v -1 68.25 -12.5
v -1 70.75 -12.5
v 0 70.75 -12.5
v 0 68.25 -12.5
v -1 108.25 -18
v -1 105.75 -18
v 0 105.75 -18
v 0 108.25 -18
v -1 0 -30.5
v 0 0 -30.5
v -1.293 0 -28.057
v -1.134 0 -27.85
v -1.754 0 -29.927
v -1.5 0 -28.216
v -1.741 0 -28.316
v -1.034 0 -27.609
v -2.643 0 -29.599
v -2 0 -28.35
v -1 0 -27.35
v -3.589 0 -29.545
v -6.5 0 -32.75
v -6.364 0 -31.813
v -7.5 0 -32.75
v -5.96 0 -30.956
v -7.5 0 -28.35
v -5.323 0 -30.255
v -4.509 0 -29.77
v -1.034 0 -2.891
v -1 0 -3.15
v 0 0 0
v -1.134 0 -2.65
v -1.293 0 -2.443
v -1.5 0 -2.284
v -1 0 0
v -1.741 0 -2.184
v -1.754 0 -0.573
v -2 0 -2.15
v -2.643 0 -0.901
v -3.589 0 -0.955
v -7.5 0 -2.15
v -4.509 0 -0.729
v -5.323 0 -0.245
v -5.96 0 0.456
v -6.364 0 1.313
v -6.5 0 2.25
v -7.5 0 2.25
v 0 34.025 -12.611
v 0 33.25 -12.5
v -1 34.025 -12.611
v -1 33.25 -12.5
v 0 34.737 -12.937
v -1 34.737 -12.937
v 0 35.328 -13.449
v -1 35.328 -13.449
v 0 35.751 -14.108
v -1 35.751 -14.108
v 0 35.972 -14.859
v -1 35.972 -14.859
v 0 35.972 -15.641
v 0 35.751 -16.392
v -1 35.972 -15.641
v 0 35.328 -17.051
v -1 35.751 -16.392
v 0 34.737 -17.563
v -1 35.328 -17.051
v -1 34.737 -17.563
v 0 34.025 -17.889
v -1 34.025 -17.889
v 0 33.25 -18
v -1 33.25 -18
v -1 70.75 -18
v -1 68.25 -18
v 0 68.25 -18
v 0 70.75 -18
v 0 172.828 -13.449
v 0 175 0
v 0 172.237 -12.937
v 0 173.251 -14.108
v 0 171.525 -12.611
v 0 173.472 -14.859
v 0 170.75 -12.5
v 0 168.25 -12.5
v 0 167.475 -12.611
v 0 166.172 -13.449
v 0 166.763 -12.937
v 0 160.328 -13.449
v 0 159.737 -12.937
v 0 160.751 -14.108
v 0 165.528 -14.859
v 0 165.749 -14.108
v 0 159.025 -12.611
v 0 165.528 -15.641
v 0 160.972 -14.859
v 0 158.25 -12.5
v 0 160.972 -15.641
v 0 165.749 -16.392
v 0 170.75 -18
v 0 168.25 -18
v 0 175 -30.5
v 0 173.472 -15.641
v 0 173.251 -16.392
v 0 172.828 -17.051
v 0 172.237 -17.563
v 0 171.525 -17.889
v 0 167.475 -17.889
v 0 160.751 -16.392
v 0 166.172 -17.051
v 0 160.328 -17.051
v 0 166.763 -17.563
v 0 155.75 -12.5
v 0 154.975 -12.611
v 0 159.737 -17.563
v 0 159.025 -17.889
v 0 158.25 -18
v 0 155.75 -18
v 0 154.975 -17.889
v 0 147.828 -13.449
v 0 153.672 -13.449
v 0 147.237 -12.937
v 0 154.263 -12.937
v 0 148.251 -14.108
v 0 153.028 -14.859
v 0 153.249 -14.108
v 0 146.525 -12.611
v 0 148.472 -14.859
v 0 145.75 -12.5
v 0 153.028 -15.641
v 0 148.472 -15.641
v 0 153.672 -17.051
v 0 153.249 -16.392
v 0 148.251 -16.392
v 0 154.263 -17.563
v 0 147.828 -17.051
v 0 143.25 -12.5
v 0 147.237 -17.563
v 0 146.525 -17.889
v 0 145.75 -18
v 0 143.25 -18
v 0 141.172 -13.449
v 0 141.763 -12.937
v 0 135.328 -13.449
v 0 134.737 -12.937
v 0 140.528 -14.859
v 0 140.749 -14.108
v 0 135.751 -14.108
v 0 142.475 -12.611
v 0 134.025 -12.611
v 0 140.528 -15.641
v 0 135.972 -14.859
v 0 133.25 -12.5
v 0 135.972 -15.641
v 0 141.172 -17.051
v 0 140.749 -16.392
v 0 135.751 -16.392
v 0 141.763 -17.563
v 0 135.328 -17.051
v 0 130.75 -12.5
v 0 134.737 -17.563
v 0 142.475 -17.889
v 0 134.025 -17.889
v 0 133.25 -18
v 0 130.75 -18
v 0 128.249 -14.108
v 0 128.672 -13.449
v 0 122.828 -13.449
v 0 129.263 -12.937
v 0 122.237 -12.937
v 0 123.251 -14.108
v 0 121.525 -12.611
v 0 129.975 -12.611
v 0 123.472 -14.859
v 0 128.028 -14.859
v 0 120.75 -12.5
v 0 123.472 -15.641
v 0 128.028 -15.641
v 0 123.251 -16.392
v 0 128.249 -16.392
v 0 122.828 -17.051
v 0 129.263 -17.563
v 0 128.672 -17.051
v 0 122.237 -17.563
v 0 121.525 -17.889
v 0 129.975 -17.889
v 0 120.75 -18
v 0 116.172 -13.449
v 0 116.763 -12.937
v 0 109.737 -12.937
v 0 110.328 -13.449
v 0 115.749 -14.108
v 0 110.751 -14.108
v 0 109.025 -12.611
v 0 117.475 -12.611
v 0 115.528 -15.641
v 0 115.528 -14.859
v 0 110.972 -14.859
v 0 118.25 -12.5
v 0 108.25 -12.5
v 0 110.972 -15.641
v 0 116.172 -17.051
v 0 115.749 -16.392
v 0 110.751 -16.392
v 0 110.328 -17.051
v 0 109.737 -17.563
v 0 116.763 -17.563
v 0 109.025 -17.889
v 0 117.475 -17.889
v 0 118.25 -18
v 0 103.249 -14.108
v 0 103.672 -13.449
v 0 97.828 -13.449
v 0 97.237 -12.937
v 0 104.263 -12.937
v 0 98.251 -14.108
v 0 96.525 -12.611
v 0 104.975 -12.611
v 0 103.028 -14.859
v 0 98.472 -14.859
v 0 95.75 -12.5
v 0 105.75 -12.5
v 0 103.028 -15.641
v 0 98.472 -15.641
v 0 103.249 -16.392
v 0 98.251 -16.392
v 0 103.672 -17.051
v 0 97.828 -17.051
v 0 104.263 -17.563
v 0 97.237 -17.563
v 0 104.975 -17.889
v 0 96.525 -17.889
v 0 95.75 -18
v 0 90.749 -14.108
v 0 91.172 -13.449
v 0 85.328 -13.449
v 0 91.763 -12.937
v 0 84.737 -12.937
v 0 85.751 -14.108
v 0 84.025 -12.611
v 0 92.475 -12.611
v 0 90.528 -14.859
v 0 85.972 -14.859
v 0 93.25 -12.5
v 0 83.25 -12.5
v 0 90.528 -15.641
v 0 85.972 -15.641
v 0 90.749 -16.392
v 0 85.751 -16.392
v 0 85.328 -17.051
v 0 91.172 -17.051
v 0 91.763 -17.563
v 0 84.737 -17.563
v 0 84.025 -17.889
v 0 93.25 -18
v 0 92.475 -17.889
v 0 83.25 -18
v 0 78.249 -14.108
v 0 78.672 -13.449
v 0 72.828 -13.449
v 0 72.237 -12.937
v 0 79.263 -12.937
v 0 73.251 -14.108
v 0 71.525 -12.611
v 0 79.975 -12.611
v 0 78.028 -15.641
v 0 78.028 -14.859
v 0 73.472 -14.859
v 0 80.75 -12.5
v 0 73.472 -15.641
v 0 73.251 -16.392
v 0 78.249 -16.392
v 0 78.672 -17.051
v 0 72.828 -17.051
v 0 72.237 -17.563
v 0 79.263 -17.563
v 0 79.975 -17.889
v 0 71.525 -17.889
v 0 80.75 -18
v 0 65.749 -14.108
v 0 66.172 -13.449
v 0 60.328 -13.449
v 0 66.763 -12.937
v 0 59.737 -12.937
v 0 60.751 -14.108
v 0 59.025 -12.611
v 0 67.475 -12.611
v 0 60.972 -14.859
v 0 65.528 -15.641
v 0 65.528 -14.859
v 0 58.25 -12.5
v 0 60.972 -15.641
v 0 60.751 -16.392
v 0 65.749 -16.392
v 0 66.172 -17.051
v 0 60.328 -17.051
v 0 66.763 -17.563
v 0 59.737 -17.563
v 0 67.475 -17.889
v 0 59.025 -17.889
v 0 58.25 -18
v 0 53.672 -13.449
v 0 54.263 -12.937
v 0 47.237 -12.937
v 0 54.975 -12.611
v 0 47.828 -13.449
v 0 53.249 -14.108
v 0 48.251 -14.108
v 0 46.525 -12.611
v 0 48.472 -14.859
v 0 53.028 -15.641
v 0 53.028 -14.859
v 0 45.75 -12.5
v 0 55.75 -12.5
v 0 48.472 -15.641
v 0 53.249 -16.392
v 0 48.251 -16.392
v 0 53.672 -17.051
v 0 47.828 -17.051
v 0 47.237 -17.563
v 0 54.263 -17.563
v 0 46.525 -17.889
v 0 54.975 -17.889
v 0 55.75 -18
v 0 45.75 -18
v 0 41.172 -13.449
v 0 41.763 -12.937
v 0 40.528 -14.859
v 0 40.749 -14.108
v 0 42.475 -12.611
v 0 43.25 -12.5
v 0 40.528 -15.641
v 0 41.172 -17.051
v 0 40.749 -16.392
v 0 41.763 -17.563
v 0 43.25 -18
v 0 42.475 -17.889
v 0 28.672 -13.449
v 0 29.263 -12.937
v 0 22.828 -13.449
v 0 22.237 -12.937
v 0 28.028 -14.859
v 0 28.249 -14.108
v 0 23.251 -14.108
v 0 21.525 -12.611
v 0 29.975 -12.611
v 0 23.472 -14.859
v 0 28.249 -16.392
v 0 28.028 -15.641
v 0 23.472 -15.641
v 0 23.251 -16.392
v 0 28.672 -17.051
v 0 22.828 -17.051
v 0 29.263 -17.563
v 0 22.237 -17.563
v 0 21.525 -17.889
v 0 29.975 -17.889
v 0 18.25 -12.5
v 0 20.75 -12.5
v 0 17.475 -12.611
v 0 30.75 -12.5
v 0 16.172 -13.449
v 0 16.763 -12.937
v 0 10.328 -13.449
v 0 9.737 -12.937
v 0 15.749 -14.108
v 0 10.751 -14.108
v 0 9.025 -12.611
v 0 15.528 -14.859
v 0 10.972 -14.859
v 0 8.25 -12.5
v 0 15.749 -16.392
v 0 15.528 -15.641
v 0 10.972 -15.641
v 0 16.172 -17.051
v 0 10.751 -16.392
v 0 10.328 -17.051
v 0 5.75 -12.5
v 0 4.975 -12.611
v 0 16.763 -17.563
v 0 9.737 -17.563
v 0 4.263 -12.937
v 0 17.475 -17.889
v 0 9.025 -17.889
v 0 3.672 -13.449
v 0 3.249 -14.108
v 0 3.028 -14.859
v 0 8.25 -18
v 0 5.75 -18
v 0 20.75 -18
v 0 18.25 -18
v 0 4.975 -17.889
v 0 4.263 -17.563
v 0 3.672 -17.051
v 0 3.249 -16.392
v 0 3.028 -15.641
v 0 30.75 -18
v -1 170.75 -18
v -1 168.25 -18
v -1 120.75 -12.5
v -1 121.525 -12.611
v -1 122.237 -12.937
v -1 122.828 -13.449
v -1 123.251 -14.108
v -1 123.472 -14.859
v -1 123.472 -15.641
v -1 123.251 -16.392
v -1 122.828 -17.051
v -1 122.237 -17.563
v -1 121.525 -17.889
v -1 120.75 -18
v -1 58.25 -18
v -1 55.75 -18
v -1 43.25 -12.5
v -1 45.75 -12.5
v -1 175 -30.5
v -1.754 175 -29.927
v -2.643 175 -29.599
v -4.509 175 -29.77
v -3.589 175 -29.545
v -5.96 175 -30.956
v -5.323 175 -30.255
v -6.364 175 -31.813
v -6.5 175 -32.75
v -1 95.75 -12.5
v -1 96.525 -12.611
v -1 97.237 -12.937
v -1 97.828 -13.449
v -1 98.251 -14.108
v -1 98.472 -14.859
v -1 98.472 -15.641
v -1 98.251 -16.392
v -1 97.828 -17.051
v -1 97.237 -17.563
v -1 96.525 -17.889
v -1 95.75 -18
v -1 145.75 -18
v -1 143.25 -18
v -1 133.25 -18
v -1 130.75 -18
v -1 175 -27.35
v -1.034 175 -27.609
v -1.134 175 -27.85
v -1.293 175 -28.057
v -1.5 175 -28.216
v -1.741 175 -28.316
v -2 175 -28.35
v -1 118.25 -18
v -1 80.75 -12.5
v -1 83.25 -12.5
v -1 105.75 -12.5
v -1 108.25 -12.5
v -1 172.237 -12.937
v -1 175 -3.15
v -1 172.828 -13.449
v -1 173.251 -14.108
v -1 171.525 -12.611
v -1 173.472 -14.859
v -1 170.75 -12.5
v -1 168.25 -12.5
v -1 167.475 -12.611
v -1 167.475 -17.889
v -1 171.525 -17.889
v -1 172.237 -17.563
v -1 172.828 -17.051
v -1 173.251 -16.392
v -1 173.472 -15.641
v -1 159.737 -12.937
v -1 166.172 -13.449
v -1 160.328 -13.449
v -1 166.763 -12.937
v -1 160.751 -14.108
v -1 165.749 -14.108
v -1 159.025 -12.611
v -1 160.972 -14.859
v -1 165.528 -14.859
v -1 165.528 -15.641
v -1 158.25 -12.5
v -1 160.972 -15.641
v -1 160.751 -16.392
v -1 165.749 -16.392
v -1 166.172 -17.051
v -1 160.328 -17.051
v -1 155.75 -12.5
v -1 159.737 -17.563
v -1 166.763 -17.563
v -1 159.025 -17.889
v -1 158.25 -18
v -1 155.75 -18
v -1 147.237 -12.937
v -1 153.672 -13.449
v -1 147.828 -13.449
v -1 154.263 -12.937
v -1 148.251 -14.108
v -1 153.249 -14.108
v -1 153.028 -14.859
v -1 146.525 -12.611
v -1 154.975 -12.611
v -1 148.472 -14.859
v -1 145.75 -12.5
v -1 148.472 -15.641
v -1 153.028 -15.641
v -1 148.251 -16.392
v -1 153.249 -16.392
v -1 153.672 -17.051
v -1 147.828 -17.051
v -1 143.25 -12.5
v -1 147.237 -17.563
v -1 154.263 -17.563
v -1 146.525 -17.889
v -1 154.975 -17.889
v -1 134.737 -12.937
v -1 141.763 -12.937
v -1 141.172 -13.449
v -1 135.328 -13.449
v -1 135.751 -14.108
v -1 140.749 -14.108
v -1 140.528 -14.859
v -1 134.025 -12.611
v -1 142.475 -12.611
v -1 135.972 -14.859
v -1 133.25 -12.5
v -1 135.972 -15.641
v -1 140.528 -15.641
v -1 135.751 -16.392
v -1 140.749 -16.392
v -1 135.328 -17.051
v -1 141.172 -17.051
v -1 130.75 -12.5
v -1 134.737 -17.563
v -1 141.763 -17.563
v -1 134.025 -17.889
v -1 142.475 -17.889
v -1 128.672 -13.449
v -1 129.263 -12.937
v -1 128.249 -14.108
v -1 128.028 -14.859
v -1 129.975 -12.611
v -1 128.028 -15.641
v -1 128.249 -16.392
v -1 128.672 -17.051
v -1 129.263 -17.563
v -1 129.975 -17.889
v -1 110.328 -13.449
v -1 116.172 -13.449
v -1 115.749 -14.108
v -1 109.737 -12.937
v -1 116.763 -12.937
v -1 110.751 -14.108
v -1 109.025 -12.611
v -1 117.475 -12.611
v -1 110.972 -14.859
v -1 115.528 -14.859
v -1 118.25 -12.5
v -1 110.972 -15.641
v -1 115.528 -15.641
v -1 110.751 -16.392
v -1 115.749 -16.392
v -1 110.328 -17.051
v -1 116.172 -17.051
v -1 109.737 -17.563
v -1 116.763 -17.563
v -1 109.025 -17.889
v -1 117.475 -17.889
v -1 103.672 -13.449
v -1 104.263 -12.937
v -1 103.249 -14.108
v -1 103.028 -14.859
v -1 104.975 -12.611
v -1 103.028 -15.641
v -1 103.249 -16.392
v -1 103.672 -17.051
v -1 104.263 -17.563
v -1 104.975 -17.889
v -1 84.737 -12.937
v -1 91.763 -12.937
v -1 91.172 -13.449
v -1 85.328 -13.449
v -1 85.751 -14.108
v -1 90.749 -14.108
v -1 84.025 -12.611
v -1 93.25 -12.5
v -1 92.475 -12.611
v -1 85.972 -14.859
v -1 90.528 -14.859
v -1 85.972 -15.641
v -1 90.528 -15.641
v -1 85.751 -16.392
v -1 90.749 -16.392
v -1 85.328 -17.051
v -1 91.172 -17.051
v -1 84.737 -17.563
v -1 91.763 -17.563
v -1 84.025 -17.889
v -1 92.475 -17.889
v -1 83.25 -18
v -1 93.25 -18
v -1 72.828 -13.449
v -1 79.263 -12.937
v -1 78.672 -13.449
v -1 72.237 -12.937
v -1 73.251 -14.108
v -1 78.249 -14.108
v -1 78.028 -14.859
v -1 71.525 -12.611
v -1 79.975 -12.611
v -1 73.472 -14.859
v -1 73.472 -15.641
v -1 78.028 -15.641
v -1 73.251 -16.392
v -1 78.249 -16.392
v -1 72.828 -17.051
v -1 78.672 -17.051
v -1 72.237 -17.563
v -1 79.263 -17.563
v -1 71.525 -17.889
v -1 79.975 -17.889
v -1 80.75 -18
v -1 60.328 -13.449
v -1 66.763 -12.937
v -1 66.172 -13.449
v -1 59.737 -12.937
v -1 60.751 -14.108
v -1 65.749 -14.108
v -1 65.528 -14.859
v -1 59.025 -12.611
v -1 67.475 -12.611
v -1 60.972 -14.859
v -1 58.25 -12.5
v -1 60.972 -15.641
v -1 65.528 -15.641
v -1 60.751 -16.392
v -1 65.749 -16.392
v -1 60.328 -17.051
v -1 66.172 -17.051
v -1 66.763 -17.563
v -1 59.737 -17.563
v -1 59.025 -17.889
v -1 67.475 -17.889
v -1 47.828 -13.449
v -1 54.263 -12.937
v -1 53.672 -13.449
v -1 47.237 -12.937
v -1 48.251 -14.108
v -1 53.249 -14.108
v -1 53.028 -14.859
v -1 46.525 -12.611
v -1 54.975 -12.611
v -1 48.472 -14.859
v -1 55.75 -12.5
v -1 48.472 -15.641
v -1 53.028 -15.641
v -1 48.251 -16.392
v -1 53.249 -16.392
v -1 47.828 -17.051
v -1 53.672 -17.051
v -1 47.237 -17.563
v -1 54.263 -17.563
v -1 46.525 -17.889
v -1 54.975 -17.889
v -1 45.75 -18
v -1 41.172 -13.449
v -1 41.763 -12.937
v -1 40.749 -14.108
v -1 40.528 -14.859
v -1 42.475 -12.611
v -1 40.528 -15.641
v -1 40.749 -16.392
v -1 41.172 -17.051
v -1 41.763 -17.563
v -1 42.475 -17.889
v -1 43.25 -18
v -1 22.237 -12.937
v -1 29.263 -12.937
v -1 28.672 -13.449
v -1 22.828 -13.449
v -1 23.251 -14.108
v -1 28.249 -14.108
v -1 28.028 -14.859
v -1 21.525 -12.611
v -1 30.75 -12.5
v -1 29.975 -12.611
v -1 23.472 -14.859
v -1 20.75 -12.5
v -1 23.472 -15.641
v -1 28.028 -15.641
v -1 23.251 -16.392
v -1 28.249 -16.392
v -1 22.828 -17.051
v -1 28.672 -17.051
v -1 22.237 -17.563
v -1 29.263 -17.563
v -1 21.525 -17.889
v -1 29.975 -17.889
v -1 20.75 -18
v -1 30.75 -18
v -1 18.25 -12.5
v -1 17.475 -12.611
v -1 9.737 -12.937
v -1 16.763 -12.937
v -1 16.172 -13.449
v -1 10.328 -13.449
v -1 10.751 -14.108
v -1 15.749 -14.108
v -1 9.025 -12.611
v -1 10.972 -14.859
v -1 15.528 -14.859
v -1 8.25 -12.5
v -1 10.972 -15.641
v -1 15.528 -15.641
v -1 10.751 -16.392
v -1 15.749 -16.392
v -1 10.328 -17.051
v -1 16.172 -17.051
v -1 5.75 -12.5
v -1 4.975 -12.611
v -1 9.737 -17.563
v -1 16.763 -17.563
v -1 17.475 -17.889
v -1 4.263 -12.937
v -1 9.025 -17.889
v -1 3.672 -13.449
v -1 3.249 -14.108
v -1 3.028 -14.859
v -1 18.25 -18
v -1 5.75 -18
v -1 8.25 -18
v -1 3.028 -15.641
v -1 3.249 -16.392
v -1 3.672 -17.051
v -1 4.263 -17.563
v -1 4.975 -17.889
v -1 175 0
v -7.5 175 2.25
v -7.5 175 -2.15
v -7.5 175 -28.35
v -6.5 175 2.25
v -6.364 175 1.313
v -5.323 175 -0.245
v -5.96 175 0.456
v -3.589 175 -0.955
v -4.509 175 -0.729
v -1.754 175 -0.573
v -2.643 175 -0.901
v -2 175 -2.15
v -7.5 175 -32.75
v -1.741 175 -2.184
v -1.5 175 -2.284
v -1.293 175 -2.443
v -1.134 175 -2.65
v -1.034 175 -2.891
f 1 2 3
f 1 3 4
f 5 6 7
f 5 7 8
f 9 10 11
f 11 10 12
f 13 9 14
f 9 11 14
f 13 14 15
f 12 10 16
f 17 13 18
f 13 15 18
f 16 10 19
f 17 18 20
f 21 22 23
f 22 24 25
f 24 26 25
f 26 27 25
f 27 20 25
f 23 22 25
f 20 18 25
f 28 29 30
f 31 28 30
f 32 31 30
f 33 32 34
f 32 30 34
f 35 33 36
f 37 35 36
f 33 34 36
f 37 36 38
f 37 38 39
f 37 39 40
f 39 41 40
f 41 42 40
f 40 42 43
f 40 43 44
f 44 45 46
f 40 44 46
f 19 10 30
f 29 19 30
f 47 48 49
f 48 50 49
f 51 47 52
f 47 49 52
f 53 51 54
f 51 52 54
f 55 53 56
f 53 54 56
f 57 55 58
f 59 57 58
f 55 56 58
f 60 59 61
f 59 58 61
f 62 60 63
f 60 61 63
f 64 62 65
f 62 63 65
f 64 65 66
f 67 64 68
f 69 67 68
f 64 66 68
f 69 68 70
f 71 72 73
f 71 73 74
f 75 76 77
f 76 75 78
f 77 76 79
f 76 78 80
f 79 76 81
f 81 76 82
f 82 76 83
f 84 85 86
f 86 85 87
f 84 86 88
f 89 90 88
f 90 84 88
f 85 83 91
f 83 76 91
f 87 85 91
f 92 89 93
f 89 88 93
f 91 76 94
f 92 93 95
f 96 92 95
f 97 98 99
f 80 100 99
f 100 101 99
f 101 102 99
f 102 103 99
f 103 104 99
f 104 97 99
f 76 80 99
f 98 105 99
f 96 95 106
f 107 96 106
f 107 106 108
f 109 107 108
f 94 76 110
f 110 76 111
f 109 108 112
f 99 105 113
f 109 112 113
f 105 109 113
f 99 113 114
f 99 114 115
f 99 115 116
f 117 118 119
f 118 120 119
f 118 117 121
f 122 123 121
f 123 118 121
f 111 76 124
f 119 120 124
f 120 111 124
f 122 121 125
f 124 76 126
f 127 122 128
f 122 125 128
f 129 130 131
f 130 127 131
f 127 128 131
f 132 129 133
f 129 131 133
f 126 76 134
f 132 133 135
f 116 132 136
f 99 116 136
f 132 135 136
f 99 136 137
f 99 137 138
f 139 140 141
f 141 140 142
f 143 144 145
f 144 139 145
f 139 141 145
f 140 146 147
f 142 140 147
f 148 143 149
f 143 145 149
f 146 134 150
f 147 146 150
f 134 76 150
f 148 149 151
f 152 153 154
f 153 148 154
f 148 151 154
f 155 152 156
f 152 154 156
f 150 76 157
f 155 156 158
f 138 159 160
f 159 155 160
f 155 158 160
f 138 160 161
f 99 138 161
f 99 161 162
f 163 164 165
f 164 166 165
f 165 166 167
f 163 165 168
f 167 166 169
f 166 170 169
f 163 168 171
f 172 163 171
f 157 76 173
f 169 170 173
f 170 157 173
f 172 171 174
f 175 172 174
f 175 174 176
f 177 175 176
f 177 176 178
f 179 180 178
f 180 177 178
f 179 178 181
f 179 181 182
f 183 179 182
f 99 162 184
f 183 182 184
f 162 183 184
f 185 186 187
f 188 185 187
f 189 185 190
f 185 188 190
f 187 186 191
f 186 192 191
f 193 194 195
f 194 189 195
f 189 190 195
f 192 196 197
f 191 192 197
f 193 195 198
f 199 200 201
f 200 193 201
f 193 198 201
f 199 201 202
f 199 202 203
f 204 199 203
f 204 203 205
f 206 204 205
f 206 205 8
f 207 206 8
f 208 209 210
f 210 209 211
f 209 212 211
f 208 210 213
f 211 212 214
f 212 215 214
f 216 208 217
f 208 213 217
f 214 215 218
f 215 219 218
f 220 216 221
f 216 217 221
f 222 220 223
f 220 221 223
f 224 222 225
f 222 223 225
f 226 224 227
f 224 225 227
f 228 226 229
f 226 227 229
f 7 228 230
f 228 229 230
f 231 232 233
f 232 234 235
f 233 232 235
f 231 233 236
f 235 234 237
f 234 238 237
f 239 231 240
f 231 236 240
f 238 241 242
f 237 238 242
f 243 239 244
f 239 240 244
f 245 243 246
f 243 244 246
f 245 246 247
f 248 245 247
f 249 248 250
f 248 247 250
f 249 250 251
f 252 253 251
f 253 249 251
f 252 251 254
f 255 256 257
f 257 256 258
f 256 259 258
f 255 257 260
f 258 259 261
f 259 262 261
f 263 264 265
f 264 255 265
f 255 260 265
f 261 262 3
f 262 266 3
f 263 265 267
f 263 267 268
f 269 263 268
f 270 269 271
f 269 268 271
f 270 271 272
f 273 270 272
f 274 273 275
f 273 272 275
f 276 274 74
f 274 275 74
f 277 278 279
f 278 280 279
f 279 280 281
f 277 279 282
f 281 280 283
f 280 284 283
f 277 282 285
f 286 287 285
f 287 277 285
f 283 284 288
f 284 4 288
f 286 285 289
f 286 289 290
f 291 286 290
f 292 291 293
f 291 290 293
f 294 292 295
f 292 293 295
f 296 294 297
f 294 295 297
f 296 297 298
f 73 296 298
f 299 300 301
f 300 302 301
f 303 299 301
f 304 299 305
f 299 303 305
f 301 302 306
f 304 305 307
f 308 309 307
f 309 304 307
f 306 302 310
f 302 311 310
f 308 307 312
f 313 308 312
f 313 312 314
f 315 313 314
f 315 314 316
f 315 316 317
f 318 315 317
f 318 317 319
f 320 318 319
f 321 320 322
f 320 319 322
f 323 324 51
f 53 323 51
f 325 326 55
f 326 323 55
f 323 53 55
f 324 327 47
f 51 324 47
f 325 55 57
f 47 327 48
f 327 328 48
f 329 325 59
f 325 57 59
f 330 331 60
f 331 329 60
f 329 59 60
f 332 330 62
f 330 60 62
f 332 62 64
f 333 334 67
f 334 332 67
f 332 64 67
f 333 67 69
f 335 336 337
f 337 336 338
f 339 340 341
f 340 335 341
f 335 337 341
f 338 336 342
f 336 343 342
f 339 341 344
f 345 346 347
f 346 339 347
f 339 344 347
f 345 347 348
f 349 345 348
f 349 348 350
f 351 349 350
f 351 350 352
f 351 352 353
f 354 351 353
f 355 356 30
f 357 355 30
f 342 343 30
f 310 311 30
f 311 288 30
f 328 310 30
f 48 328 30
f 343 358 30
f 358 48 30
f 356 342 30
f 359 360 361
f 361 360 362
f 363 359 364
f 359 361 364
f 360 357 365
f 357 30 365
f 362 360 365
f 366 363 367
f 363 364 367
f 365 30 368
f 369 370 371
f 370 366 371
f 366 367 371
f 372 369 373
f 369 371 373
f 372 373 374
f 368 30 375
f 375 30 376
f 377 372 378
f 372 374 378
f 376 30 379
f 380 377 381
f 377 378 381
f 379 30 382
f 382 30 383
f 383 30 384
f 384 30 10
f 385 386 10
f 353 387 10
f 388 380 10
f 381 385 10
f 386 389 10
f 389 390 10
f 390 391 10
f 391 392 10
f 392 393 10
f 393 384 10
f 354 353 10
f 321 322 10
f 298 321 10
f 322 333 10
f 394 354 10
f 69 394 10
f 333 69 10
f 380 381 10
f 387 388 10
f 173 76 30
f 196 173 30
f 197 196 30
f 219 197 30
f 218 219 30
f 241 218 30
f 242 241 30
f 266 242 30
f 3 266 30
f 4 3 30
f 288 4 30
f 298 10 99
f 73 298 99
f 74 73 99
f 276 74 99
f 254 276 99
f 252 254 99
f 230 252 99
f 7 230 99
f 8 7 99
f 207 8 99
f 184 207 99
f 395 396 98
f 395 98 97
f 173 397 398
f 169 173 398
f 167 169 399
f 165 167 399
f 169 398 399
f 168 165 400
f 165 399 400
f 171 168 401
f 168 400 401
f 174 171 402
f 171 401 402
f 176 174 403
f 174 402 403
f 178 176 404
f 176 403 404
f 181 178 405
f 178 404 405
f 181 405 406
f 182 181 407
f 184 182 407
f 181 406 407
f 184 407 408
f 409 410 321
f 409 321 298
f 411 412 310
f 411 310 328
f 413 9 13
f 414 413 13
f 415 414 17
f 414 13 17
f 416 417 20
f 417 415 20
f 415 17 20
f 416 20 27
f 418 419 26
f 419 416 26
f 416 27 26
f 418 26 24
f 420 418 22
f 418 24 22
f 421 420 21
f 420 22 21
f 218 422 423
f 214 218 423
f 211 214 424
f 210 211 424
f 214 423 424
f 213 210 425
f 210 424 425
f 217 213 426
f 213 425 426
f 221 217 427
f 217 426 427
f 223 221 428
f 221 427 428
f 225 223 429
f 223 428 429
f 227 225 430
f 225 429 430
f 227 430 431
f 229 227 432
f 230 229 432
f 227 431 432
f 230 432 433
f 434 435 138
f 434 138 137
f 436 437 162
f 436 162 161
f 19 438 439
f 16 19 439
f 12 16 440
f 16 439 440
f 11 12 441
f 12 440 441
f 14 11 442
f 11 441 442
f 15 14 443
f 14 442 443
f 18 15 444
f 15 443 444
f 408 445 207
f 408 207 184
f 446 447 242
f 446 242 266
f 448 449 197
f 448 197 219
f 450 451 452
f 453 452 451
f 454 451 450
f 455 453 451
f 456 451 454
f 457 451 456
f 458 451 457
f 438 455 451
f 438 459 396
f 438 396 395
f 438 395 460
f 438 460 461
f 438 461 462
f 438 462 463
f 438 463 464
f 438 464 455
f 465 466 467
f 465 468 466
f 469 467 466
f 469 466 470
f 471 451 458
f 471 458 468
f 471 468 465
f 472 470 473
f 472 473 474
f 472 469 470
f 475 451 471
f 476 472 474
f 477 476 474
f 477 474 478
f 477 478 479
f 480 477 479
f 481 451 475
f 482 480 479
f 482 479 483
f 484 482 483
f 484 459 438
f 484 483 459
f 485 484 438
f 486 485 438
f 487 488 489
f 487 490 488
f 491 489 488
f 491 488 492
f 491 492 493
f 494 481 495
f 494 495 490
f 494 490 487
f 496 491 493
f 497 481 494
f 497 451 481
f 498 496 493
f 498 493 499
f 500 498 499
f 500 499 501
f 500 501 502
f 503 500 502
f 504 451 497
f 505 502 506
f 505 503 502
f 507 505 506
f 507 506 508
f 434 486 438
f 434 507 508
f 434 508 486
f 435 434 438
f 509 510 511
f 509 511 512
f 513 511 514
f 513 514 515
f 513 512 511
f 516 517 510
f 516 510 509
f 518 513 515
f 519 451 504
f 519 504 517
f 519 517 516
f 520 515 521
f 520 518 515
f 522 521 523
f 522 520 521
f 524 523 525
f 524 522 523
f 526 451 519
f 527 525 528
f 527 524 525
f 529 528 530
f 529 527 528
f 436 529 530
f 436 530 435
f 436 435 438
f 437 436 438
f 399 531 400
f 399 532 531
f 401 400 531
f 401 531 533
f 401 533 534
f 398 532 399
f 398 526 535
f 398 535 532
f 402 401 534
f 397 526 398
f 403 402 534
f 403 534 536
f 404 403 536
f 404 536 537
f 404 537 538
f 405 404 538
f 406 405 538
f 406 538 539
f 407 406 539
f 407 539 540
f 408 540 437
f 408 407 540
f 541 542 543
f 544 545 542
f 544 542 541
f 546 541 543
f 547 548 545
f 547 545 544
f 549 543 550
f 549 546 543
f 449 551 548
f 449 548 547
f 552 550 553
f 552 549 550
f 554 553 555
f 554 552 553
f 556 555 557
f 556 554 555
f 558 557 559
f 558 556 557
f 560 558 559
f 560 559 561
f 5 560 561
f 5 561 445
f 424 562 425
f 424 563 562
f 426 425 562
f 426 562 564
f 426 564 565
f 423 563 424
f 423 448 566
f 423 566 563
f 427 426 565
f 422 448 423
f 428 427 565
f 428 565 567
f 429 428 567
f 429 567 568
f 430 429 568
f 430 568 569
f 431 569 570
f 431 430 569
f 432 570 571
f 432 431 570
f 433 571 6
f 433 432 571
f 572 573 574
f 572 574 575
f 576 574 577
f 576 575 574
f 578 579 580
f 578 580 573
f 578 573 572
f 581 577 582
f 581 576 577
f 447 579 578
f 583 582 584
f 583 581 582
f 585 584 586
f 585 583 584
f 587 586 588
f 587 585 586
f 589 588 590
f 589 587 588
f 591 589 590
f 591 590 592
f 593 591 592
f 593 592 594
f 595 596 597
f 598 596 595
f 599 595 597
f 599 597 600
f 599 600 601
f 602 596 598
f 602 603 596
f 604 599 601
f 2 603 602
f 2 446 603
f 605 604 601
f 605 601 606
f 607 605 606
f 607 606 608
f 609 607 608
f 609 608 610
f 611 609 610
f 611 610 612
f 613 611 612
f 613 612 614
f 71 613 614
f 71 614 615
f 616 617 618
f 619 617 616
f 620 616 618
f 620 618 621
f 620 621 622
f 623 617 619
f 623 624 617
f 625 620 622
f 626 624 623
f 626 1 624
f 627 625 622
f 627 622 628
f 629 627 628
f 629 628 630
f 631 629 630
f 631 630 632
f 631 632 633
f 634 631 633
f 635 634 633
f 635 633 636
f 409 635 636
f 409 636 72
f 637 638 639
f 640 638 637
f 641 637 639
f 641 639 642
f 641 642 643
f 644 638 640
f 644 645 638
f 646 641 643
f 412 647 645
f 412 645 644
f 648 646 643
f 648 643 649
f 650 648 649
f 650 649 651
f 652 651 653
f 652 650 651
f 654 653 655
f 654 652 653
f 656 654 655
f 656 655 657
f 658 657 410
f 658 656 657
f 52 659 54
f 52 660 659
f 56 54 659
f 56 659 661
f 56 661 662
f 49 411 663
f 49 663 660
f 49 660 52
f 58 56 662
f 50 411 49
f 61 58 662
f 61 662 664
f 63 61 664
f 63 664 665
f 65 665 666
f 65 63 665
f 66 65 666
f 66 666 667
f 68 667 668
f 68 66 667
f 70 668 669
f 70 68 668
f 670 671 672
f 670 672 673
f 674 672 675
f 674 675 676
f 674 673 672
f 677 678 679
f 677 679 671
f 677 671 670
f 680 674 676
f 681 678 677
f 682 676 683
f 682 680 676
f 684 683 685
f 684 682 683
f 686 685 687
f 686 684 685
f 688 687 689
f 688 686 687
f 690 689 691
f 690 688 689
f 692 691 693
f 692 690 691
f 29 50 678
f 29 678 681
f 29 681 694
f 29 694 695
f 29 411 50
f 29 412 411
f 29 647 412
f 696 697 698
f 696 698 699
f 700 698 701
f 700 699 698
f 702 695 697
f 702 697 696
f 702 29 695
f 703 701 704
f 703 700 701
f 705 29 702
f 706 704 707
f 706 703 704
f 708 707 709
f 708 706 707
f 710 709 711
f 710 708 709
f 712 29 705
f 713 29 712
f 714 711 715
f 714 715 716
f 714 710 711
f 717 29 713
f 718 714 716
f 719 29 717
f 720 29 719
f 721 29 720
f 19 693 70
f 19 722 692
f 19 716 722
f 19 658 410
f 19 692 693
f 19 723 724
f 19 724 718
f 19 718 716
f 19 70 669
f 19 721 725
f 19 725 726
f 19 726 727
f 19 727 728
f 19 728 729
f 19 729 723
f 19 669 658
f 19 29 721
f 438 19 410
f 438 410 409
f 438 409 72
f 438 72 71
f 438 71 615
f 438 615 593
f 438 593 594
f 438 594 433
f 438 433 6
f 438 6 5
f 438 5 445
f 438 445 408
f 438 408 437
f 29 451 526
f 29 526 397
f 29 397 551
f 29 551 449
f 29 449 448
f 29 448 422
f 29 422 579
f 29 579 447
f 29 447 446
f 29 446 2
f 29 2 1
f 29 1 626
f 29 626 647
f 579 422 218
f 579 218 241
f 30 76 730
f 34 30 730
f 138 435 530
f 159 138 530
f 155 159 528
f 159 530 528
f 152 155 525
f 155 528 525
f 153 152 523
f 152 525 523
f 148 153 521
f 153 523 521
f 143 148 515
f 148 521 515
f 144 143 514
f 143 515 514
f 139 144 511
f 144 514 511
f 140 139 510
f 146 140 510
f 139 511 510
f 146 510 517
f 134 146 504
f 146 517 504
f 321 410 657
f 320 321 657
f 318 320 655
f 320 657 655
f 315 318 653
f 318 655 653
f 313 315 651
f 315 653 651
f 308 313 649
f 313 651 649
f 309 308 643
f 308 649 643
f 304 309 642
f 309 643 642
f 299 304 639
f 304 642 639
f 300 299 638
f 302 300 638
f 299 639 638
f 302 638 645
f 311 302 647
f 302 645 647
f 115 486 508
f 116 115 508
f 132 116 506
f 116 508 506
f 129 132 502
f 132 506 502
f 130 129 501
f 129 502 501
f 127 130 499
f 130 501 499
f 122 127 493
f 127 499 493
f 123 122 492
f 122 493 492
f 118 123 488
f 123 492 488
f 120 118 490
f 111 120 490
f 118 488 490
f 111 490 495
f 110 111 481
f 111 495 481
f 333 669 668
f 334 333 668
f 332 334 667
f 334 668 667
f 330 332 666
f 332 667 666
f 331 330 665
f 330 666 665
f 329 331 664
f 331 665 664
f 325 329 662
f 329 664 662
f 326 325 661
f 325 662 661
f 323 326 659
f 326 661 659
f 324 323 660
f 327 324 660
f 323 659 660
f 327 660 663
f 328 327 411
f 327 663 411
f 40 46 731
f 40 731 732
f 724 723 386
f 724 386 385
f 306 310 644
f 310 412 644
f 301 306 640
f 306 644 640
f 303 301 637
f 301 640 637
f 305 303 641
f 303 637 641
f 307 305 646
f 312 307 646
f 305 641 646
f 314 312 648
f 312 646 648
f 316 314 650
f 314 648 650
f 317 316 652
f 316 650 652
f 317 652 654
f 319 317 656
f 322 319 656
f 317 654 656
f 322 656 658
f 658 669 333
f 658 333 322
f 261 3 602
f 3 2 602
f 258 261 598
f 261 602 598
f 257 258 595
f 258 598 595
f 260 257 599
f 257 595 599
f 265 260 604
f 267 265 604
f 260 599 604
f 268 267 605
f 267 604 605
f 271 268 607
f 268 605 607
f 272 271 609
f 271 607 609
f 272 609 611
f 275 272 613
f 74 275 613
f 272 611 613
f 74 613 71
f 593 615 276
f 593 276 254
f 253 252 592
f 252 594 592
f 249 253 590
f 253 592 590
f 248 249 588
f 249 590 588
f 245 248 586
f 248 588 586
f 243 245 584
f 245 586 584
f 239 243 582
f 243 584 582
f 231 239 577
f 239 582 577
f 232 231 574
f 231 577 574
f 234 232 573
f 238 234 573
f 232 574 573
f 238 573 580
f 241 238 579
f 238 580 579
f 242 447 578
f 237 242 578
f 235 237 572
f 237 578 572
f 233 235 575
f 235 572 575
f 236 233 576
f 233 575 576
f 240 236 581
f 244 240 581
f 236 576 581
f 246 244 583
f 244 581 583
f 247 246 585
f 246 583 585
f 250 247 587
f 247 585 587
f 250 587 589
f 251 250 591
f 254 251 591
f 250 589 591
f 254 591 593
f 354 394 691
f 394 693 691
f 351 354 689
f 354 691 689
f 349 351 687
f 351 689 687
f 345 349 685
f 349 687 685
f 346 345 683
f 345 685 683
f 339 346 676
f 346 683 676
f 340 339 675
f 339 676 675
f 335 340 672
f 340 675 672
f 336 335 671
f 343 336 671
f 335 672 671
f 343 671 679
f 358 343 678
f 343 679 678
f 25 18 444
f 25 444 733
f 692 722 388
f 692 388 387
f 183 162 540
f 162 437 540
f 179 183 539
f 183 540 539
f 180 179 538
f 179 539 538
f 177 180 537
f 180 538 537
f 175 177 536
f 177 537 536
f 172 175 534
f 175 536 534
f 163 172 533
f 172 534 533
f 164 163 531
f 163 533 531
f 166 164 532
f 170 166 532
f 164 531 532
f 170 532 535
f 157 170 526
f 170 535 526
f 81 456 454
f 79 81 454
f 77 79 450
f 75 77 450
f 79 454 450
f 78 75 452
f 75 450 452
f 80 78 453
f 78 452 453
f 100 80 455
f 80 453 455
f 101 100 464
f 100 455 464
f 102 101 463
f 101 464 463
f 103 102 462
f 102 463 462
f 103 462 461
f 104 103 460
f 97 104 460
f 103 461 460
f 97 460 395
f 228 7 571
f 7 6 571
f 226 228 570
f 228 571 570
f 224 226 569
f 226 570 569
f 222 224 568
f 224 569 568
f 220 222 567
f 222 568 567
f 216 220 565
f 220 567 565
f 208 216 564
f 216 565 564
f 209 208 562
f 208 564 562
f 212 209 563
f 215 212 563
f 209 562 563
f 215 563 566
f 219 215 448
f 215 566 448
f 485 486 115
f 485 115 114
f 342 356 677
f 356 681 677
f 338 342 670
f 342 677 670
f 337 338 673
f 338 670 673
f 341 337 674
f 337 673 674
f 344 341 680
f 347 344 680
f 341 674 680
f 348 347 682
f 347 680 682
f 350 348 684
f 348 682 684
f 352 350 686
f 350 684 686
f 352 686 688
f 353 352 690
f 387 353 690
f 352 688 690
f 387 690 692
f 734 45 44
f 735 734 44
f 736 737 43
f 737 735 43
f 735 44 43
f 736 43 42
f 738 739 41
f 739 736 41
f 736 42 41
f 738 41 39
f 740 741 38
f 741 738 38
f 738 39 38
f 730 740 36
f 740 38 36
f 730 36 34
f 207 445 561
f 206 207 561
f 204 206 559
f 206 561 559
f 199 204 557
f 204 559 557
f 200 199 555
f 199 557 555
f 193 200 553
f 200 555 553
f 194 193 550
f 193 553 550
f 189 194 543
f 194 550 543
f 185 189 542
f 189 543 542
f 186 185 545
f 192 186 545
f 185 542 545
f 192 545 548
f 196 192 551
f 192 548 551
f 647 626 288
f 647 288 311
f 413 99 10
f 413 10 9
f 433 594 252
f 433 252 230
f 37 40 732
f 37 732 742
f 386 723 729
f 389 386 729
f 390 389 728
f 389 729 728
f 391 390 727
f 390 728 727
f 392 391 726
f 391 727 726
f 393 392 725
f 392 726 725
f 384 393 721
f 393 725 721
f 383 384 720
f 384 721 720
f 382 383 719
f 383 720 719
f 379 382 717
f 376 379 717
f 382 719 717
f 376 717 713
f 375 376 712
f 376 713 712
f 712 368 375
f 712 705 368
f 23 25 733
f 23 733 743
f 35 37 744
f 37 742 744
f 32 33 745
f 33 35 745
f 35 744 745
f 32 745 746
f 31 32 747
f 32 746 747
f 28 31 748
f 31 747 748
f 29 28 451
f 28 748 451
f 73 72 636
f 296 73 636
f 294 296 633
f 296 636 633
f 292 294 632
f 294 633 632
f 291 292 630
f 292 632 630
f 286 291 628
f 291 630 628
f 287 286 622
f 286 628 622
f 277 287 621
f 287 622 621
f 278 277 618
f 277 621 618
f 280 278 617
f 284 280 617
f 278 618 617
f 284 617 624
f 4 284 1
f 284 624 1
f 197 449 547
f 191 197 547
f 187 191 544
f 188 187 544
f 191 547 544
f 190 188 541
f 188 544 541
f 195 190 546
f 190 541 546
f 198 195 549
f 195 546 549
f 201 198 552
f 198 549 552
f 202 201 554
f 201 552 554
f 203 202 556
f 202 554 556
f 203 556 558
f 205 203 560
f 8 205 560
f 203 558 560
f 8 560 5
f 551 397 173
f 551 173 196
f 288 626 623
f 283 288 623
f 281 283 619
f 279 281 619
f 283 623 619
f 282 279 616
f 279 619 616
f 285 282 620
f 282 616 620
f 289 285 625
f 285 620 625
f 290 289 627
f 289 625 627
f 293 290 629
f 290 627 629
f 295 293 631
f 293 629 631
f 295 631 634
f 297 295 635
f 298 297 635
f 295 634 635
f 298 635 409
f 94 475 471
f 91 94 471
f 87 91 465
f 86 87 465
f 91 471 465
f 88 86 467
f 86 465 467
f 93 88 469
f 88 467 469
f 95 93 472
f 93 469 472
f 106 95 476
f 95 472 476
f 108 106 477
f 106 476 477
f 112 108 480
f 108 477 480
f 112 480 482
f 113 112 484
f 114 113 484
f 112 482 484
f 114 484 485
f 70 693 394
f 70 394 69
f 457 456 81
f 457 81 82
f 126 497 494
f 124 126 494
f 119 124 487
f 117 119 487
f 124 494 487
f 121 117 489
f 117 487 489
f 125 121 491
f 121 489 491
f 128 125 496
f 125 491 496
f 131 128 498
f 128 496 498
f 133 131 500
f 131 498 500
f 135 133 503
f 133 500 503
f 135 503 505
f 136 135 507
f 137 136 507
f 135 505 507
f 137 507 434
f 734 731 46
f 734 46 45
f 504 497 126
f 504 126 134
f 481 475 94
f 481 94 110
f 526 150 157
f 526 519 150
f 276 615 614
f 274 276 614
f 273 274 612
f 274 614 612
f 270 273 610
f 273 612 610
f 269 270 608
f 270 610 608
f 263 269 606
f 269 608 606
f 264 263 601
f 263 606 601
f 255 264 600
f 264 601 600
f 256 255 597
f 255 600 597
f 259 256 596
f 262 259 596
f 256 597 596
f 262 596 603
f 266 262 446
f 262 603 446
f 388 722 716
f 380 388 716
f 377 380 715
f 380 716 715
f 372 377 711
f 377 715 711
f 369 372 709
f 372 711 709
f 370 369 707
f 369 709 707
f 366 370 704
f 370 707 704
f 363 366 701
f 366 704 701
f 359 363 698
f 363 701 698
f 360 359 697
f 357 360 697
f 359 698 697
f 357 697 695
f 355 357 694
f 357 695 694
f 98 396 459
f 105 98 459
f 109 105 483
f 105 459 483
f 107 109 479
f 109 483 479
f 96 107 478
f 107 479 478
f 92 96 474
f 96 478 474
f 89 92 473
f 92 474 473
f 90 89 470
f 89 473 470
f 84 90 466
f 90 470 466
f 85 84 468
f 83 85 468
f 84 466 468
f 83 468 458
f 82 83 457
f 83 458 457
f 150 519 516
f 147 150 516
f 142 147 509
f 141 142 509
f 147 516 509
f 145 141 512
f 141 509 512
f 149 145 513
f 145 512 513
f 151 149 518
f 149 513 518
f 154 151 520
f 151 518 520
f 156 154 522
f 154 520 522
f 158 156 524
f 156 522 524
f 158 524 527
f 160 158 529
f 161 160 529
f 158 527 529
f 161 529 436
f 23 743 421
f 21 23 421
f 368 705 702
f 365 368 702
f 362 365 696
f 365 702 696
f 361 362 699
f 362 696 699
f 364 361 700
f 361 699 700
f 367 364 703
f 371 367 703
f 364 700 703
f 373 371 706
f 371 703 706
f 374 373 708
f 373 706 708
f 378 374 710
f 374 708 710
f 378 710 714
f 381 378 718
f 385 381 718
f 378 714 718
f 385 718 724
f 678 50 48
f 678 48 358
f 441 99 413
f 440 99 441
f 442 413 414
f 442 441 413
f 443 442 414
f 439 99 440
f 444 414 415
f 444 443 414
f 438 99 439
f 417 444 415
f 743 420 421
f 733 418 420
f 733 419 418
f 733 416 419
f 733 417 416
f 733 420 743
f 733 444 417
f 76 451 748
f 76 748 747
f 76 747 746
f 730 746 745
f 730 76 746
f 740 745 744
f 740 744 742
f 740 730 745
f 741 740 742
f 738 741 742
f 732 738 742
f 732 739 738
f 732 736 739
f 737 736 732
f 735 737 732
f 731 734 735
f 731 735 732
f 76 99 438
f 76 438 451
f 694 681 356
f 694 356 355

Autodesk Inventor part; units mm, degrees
ref_plane "YZ Plane" through (0, 0, 0) normal (1, 0, 0) x (0, 1, 0)
ref_plane "XZ Plane" through (0, 0, 0) normal (0, 1, 0) x (-1, 0, 0)
ref_plane "XY Plane" through (0, 0, 0) normal (0, 0, 1) x (1, 0, 0)
sketch "スケッチ1" plane through (0, 0, 0) normal (0, 1, 0) x (-1, 0, 0)
  line L0 (0, 0) -> (0, -30.5)
  line L1 (7.5, 2.25) -> (7.5, -32.75)
  line L2 (11.9991, -15.25) -> (-11.598, -15.25)
  line L3 (7.5, 2.25) -> (6.5, 2.25)
  line L4 (7.5, 2.25) -> (8.5, 2.25) construction
  line L5 (0, 0) -> (1, 0)
  arc A0 (1, 0) -> (6.5, 2.25) centre (3.2952, 2.2367) ccw
  line L6 (7.5, -32.75) -> (6.5, -32.75)
  line L7 (0, -30.5) -> (1, -30.5)
  arc A1 (6.5, -32.75) -> (1, -30.5) centre (3.2952, -32.7367) ccw
  line L8 (7.5, -2.15) -> (1, -2.15)
  line L9 (1, -2.15) -> (1, -28.35)
  line L10 (1, -28.35) -> (7.5, -28.35)
  dimension "d0" = 30.5
  dimension "d1" = 35
  dimension "d2" = 7.5
  dimension "d3" = 2.25
  dimension "d4" = 1
  dimension "d5" = 180
  dimension "d6" = 1
  dimension "d7" = 4.4
  dimension "d8" = 4.4
extrude "押し出し1" add sketch "スケッチ1" along normal blind 175 contours L5 A0 L3 L1 L8 L9 L2 L0 | L2 L9 L10 L1 L6 A1 L7 L0
sketch "スケッチ2" plane through (-1, 0, -28.35) normal (-1, 0, 0) x (0, 0, 1)
  line L0 (0, 0) -> (26.2, 0) projected
  line L1 (26.2, 0) -> (26.2, 175) projected
  line L2 (0, 175) -> (26.2, 175) projected
  line L3 (0, 0) -> (0, 175) projected
  line L4 (15.85, 3) -> (10.35, 3)
  line L5 (10.35, 3) -> (10.35, 11)
  line L6 (10.35, 11) -> (15.85, 11)
  line L7 (15.85, 11) -> (15.85, 3)
  arc A0 (13.1, 3) -> (15.85, 5.75) centre (13.1, 5.75) ccw
  arc A1 (10.35, 5.75) -> (13.1, 3) centre (13.1, 5.75) ccw
  arc A2 (13.1, 11) -> (10.35, 8.25) centre (13.1, 8.25) ccw
  arc A3 (15.85, 8.25) -> (13.1, 11) centre (13.1, 8.25) ccw
  line L8 (15.85, 15.5) -> (10.35, 15.5)
  arc A4 (13.1, 15.5) -> (15.85, 18.25) centre (13.1, 18.25) ccw
  arc A5 (10.35, 18.25) -> (13.1, 15.5) centre (13.1, 18.25) ccw
  arc A6 (15.85, 20.75) -> (13.1, 23.5) centre (13.1, 20.75) ccw
  arc A7 (13.1, 23.5) -> (10.35, 20.75) centre (13.1, 20.75) ccw
  line L9 (10.35, 15.5) -> (10.35, 23.5)
  line L10 (15.85, 23.5) -> (15.85, 15.5)
  line L11 (15.85, 28) -> (10.35, 28)
  arc A8 (13.1, 28) -> (15.85, 30.75) centre (13.1, 30.75) ccw
  arc A9 (10.35, 30.75) -> (13.1, 28) centre (13.1, 30.75) ccw
  arc A10 (15.85, 33.25) -> (13.1, 36) centre (13.1, 33.25) ccw
  arc A11 (13.1, 36) -> (10.35, 33.25) centre (13.1, 33.25) ccw
  line L12 (10.35, 28) -> (10.35, 36)
  line L13 (15.85, 36) -> (15.85, 28)
  line L14 (15.85, 40.5) -> (10.35, 40.5)
  arc A12 (13.1, 40.5) -> (15.85, 43.25) centre (13.1, 43.25) ccw
  arc A13 (10.35, 43.25) -> (13.1, 40.5) centre (13.1, 43.25) ccw
  arc A14 (15.85, 45.75) -> (13.1, 48.5) centre (13.1, 45.75) ccw
  arc A15 (13.1, 48.5) -> (10.35, 45.75) centre (13.1, 45.75) ccw
  line L15 (10.35, 40.5) -> (10.35, 48.5)
  line L16 (15.85, 48.5) -> (15.85, 40.5)
  line L17 (15.85, 53) -> (10.35, 53)
  arc A16 (13.1, 53) -> (15.85, 55.75) centre (13.1, 55.75) ccw
  arc A17 (10.35, 55.75) -> (13.1, 53) centre (13.1, 55.75) ccw
  arc A18 (15.85, 58.25) -> (13.1, 61) centre (13.1, 58.25) ccw
  arc A19 (13.1, 61) -> (10.35, 58.25) centre (13.1, 58.25) ccw
  line L18 (10.35, 53) -> (10.35, 61)
  line L19 (15.85, 61) -> (15.85, 53)
  line L20 (15.85, 65.5) -> (10.35, 65.5)
  arc A20 (13.1, 65.5) -> (15.85, 68.25) centre (13.1, 68.25) ccw
  arc A21 (10.35, 68.25) -> (13.1, 65.5) centre (13.1, 68.25) ccw
  arc A22 (15.85, 70.75) -> (13.1, 73.5) centre (13.1, 70.75) ccw
  arc A23 (13.1, 73.5) -> (10.35, 70.75) centre (13.1, 70.75) ccw
  line L21 (10.35, 65.5) -> (10.35, 73.5)
  line L22 (15.85, 73.5) -> (15.85, 65.5)
  line L23 (15.85, 78) -> (10.35, 78)
  arc A24 (13.1, 78) -> (15.85, 80.75) centre (13.1, 80.75) ccw
  arc A25 (10.35, 80.75) -> (13.1, 78) centre (13.1, 80.75) ccw
  arc A26 (15.85, 83.25) -> (13.1, 86) centre (13.1, 83.25) ccw
  arc A27 (13.1, 86) -> (10.35, 83.25) centre (13.1, 83.25) ccw
  line L24 (10.35, 78) -> (10.35, 86)
  line L25 (15.85, 86) -> (15.85, 78)
  line L26 (15.85, 90.5) -> (10.35, 90.5)
  arc A28 (13.1, 90.5) -> (15.85, 93.25) centre (13.1, 93.25) ccw
  arc A29 (10.35, 93.25) -> (13.1, 90.5) centre (13.1, 93.25) ccw
  arc A30 (15.85, 95.75) -> (13.1, 98.5) centre (13.1, 95.75) ccw
  arc A31 (13.1, 98.5) -> (10.35, 95.75) centre (13.1, 95.75) ccw
  line L27 (10.35, 90.5) -> (10.35, 98.5)
  line L28 (15.85, 98.5) -> (15.85, 90.5)
  line L29 (15.85, 103) -> (10.35, 103)
  arc A32 (13.1, 103) -> (15.85, 105.75) centre (13.1, 105.75) ccw
  arc A33 (10.35, 105.75) -> (13.1, 103) centre (13.1, 105.75) ccw
  arc A34 (15.85, 108.25) -> (13.1, 111) centre (13.1, 108.25) ccw
  arc A35 (13.1, 111) -> (10.35, 108.25) centre (13.1, 108.25) ccw
  line L30 (10.35, 103) -> (10.35, 111)
  line L31 (15.85, 111) -> (15.85, 103)
  line L32 (15.85, 115.5) -> (10.35, 115.5)
  arc A36 (13.1, 115.5) -> (15.85, 118.25) centre (13.1, 118.25) ccw
  arc A37 (10.35, 118.25) -> (13.1, 115.5) centre (13.1, 118.25) ccw
  arc A38 (15.85, 120.75) -> (13.1, 123.5) centre (13.1, 120.75) ccw
  arc A39 (13.1, 123.5) -> (10.35, 120.75) centre (13.1, 120.75) ccw
  line L33 (10.35, 115.5) -> (10.35, 123.5)
  line L34 (15.85, 123.5) -> (15.85, 115.5)
  line L35 (15.85, 128) -> (10.35, 128)
  arc A40 (13.1, 128) -> (15.85, 130.75) centre (13.1, 130.75) ccw
  arc A41 (10.35, 130.75) -> (13.1, 128) centre (13.1, 130.75) ccw
  arc A42 (15.85, 133.25) -> (13.1, 136) centre (13.1, 133.25) ccw
  arc A43 (13.1, 136) -> (10.35, 133.25) centre (13.1, 133.25) ccw
  line L36 (10.35, 128) -> (10.35, 136)
  line L37 (15.85, 136) -> (15.85, 128)
  line L38 (15.85, 140.5) -> (10.35, 140.5)
  arc A44 (13.1, 140.5) -> (15.85, 143.25) centre (13.1, 143.25) ccw
  arc A45 (10.35, 143.25) -> (13.1, 140.5) centre (13.1, 143.25) ccw
  arc A46 (15.85, 145.75) -> (13.1, 148.5) centre (13.1, 145.75) ccw
  arc A47 (13.1, 148.5) -> (10.35, 145.75) centre (13.1, 145.75) ccw
  line L39 (10.35, 140.5) -> (10.35, 148.5)
  line L40 (15.85, 148.5) -> (15.85, 140.5)
  line L41 (15.85, 153) -> (10.35, 153)
  arc A48 (13.1, 153) -> (15.85, 155.75) centre (13.1, 155.75) ccw
  arc A49 (10.35, 155.75) -> (13.1, 153) centre (13.1, 155.75) ccw
  arc A50 (15.85, 158.25) -> (13.1, 161) centre (13.1, 158.25) ccw
  arc A51 (13.1, 161) -> (10.35, 158.25) centre (13.1, 158.25) ccw
  line L42 (10.35, 153) -> (10.35, 161)
  line L43 (15.85, 161) -> (15.85, 153)
  line L44 (15.85, 165.5) -> (10.35, 165.5)
  arc A52 (13.1, 165.5) -> (15.85, 168.25) centre (13.1, 168.25) ccw
  arc A53 (10.35, 168.25) -> (13.1, 165.5) centre (13.1, 168.25) ccw
  arc A54 (15.85, 170.75) -> (13.1, 173.5) centre (13.1, 170.75) ccw
  arc A55 (13.1, 173.5) -> (10.35, 170.75) centre (13.1, 170.75) ccw
  line L45 (10.35, 165.5) -> (10.35, 173.5)
  line L46 (15.85, 173.5) -> (15.85, 165.5)
  line L47 (15.85, 178) -> (10.35, 178)
  arc A56 (13.1, 178) -> (15.85, 180.75) centre (13.1, 180.75) ccw
  arc A57 (10.35, 180.75) -> (13.1, 178) centre (13.1, 180.75) ccw
  arc A58 (15.85, 183.25) -> (13.1, 186) centre (13.1, 183.25) ccw
  arc A59 (13.1, 186) -> (10.35, 183.25) centre (13.1, 183.25) ccw
  line L48 (10.35, 178) -> (10.35, 186)
  line L49 (15.85, 186) -> (15.85, 178)
  line L50 (15.85, 190.5) -> (10.35, 190.5)
  arc A60 (13.1, 190.5) -> (15.85, 193.25) centre (13.1, 193.25) ccw
  arc A61 (10.35, 193.25) -> (13.1, 190.5) centre (13.1, 193.25) ccw
  arc A62 (15.85, 195.75) -> (13.1, 198.5) centre (13.1, 195.75) ccw
  arc A63 (13.1, 198.5) -> (10.35, 195.75) centre (13.1, 195.75) ccw
  line L51 (10.35, 190.5) -> (10.35, 198.5)
  line L52 (15.85, 198.5) -> (15.85, 190.5)
  line L53 (15.85, 203) -> (10.35, 203)
  arc A64 (13.1, 203) -> (15.85, 205.75) centre (13.1, 205.75) ccw
  arc A65 (10.35, 205.75) -> (13.1, 203) centre (13.1, 205.75) ccw
  arc A66 (15.85, 208.25) -> (13.1, 211) centre (13.1, 208.25) ccw
  arc A67 (13.1, 211) -> (10.35, 208.25) centre (13.1, 208.25) ccw
  line L54 (10.35, 203) -> (10.35, 211)
  line L55 (15.85, 211) -> (15.85, 203)
  line L56 (15.85, 215.5) -> (10.35, 215.5)
  arc A68 (13.1, 215.5) -> (15.85, 218.25) centre (13.1, 218.25) ccw
  arc A69 (10.35, 218.25) -> (13.1, 215.5) centre (13.1, 218.25) ccw
  arc A70 (15.85, 220.75) -> (13.1, 223.5) centre (13.1, 220.75) ccw
  arc A71 (13.1, 223.5) -> (10.35, 220.75) centre (13.1, 220.75) ccw
  line L57 (10.35, 215.5) -> (10.35, 223.5)
  line L58 (15.85, 223.5) -> (15.85, 215.5)
  line L59 (15.85, 228) -> (10.35, 228)
  arc A72 (13.1, 228) -> (15.85, 230.75) centre (13.1, 230.75) ccw
  arc A73 (10.35, 230.75) -> (13.1, 228) centre (13.1, 230.75) ccw
  arc A74 (15.85, 233.25) -> (13.1, 236) centre (13.1, 233.25) ccw
  arc A75 (13.1, 236) -> (10.35, 233.25) centre (13.1, 233.25) ccw
  line L60 (10.35, 228) -> (10.35, 236)
  line L61 (15.85, 236) -> (15.85, 228)
  line L62 (15.85, 240.5) -> (10.35, 240.5)
  arc A76 (13.1, 240.5) -> (15.85, 243.25) centre (13.1, 243.25) ccw
  arc A77 (10.35, 243.25) -> (13.1, 240.5) centre (13.1, 243.25) ccw
  arc A78 (15.85, 245.75) -> (13.1, 248.5) centre (13.1, 245.75) ccw
  arc A79 (13.1, 248.5) -> (10.35, 245.75) centre (13.1, 245.75) ccw
  line L63 (10.35, 240.5) -> (10.35, 248.5)
  line L64 (15.85, 248.5) -> (15.85, 240.5)
  line L65 (15.85, 253) -> (10.35, 253)
  arc A80 (13.1, 253) -> (15.85, 255.75) centre (13.1, 255.75) ccw
  arc A81 (10.35, 255.75) -> (13.1, 253) centre (13.1, 255.75) ccw
  arc A82 (15.85, 258.25) -> (13.1, 261) centre (13.1, 258.25) ccw
  arc A83 (13.1, 261) -> (10.35, 258.25) centre (13.1, 258.25) ccw
  line L66 (10.35, 253) -> (10.35, 261)
  line L67 (15.85, 261) -> (15.85, 253)
  line L68 (15.85, 265.5) -> (10.35, 265.5)
  arc A84 (13.1, 265.5) -> (15.85, 268.25) centre (13.1, 268.25) ccw
  arc A85 (10.35, 268.25) -> (13.1, 265.5) centre (13.1, 268.25) ccw
  arc A86 (15.85, 270.75) -> (13.1, 273.5) centre (13.1, 270.75) ccw
  arc A87 (13.1, 273.5) -> (10.35, 270.75) centre (13.1, 270.75) ccw
  line L69 (10.35, 265.5) -> (10.35, 273.5)
  line L70 (15.85, 273.5) -> (15.85, 265.5)
  line L71 (15.85, 278) -> (10.35, 278)
  arc A88 (13.1, 278) -> (15.85, 280.75) centre (13.1, 280.75) ccw
  arc A89 (10.35, 280.75) -> (13.1, 278) centre (13.1, 280.75) ccw
  arc A90 (15.85, 283.25) -> (13.1, 286) centre (13.1, 283.25) ccw
  arc A91 (13.1, 286) -> (10.35, 283.25) centre (13.1, 283.25) ccw
  line L72 (10.35, 278) -> (10.35, 286)
  line L73 (15.85, 286) -> (15.85, 278)
  line L74 (15.85, 290.5) -> (10.35, 290.5)
  arc A92 (13.1, 290.5) -> (15.85, 293.25) centre (13.1, 293.25) ccw
  arc A93 (10.35, 293.25) -> (13.1, 290.5) centre (13.1, 293.25) ccw
  arc A94 (15.85, 295.75) -> (13.1, 298.5) centre (13.1, 295.75) ccw
  arc A95 (13.1, 298.5) -> (10.35, 295.75) centre (13.1, 295.75) ccw
  line L75 (10.35, 290.5) -> (10.35, 298.5)
  line L76 (15.85, 298.5) -> (15.85, 290.5)
  line L77 (15.85, 303) -> (10.35, 303)
  arc A96 (13.1, 303) -> (15.85, 305.75) centre (13.1, 305.75) ccw
  arc A97 (10.35, 305.75) -> (13.1, 303) centre (13.1, 305.75) ccw
  arc A98 (15.85, 308.25) -> (13.1, 311) centre (13.1, 308.25) ccw
  arc A99 (13.1, 311) -> (10.35, 308.25) centre (13.1, 308.25) ccw
  line L78 (10.35, 303) -> (10.35, 311)
  line L79 (15.85, 311) -> (15.85, 303)
  point P0 (28.35, 0)
  dimension "d11" = 5.5
  dimension "d12" = 8
  dimension "d13" = 10.35
  dimension "d14" = 3
  dimension "d16" = 2.75
  dimension "d18" = 2.75
  dimension "d21" = 12.5
extrude "押し出し2" cut sketch "スケッチ2" against normal blind 3 contours A1 L5 A2 A3 L7 A0 | A5 L9 A7 A6 L10 A4 | A9 L12 A11 A10 L13 A8 | A13 L15 A15 A14 L16 A12 | A17 L18 A19 A18 L19 A16 | A21 L21 A23 A22 L22 A20 | A25 L24 A27 A26 L25 A24 | A29 L27 A31 A30 L28 A28 | A33 L30 A35 A34 L31 A32 | A37 L33 A39 A38 L34 A36 | A41 L36 A43 A42 L37 A40 | A45 L39 A47 A46 L40 A44 | A49 L42 A51 A50 L43 A48 | A53 L45 A55 A54 L46 A52 | A57 L48 A59 A58 L49 A56 | A61 L51 A63 A62 L52 A60 | A65 L54 A67 A66 L55 A64 | A69 L57 A71 A70 L58 A68 | A73 L60 A75 A74 L61 A72 | A77 L63 A79 A78 L64 A76 | A81 L66 A83 A82 L67 A80 | A85 L69 A87 A86 L70 A84 | A89 L72 A91 A90 L73 A88 | A93 L75 A95 A94 L76 A92
fillet "フィレット1" radius 1 2 edges at (-1, 87.5, -28.35) (-1, 87.5, -2.15)
properties part number "CB_dinrail_mk" material "アルミニウム 6061-AHC"
